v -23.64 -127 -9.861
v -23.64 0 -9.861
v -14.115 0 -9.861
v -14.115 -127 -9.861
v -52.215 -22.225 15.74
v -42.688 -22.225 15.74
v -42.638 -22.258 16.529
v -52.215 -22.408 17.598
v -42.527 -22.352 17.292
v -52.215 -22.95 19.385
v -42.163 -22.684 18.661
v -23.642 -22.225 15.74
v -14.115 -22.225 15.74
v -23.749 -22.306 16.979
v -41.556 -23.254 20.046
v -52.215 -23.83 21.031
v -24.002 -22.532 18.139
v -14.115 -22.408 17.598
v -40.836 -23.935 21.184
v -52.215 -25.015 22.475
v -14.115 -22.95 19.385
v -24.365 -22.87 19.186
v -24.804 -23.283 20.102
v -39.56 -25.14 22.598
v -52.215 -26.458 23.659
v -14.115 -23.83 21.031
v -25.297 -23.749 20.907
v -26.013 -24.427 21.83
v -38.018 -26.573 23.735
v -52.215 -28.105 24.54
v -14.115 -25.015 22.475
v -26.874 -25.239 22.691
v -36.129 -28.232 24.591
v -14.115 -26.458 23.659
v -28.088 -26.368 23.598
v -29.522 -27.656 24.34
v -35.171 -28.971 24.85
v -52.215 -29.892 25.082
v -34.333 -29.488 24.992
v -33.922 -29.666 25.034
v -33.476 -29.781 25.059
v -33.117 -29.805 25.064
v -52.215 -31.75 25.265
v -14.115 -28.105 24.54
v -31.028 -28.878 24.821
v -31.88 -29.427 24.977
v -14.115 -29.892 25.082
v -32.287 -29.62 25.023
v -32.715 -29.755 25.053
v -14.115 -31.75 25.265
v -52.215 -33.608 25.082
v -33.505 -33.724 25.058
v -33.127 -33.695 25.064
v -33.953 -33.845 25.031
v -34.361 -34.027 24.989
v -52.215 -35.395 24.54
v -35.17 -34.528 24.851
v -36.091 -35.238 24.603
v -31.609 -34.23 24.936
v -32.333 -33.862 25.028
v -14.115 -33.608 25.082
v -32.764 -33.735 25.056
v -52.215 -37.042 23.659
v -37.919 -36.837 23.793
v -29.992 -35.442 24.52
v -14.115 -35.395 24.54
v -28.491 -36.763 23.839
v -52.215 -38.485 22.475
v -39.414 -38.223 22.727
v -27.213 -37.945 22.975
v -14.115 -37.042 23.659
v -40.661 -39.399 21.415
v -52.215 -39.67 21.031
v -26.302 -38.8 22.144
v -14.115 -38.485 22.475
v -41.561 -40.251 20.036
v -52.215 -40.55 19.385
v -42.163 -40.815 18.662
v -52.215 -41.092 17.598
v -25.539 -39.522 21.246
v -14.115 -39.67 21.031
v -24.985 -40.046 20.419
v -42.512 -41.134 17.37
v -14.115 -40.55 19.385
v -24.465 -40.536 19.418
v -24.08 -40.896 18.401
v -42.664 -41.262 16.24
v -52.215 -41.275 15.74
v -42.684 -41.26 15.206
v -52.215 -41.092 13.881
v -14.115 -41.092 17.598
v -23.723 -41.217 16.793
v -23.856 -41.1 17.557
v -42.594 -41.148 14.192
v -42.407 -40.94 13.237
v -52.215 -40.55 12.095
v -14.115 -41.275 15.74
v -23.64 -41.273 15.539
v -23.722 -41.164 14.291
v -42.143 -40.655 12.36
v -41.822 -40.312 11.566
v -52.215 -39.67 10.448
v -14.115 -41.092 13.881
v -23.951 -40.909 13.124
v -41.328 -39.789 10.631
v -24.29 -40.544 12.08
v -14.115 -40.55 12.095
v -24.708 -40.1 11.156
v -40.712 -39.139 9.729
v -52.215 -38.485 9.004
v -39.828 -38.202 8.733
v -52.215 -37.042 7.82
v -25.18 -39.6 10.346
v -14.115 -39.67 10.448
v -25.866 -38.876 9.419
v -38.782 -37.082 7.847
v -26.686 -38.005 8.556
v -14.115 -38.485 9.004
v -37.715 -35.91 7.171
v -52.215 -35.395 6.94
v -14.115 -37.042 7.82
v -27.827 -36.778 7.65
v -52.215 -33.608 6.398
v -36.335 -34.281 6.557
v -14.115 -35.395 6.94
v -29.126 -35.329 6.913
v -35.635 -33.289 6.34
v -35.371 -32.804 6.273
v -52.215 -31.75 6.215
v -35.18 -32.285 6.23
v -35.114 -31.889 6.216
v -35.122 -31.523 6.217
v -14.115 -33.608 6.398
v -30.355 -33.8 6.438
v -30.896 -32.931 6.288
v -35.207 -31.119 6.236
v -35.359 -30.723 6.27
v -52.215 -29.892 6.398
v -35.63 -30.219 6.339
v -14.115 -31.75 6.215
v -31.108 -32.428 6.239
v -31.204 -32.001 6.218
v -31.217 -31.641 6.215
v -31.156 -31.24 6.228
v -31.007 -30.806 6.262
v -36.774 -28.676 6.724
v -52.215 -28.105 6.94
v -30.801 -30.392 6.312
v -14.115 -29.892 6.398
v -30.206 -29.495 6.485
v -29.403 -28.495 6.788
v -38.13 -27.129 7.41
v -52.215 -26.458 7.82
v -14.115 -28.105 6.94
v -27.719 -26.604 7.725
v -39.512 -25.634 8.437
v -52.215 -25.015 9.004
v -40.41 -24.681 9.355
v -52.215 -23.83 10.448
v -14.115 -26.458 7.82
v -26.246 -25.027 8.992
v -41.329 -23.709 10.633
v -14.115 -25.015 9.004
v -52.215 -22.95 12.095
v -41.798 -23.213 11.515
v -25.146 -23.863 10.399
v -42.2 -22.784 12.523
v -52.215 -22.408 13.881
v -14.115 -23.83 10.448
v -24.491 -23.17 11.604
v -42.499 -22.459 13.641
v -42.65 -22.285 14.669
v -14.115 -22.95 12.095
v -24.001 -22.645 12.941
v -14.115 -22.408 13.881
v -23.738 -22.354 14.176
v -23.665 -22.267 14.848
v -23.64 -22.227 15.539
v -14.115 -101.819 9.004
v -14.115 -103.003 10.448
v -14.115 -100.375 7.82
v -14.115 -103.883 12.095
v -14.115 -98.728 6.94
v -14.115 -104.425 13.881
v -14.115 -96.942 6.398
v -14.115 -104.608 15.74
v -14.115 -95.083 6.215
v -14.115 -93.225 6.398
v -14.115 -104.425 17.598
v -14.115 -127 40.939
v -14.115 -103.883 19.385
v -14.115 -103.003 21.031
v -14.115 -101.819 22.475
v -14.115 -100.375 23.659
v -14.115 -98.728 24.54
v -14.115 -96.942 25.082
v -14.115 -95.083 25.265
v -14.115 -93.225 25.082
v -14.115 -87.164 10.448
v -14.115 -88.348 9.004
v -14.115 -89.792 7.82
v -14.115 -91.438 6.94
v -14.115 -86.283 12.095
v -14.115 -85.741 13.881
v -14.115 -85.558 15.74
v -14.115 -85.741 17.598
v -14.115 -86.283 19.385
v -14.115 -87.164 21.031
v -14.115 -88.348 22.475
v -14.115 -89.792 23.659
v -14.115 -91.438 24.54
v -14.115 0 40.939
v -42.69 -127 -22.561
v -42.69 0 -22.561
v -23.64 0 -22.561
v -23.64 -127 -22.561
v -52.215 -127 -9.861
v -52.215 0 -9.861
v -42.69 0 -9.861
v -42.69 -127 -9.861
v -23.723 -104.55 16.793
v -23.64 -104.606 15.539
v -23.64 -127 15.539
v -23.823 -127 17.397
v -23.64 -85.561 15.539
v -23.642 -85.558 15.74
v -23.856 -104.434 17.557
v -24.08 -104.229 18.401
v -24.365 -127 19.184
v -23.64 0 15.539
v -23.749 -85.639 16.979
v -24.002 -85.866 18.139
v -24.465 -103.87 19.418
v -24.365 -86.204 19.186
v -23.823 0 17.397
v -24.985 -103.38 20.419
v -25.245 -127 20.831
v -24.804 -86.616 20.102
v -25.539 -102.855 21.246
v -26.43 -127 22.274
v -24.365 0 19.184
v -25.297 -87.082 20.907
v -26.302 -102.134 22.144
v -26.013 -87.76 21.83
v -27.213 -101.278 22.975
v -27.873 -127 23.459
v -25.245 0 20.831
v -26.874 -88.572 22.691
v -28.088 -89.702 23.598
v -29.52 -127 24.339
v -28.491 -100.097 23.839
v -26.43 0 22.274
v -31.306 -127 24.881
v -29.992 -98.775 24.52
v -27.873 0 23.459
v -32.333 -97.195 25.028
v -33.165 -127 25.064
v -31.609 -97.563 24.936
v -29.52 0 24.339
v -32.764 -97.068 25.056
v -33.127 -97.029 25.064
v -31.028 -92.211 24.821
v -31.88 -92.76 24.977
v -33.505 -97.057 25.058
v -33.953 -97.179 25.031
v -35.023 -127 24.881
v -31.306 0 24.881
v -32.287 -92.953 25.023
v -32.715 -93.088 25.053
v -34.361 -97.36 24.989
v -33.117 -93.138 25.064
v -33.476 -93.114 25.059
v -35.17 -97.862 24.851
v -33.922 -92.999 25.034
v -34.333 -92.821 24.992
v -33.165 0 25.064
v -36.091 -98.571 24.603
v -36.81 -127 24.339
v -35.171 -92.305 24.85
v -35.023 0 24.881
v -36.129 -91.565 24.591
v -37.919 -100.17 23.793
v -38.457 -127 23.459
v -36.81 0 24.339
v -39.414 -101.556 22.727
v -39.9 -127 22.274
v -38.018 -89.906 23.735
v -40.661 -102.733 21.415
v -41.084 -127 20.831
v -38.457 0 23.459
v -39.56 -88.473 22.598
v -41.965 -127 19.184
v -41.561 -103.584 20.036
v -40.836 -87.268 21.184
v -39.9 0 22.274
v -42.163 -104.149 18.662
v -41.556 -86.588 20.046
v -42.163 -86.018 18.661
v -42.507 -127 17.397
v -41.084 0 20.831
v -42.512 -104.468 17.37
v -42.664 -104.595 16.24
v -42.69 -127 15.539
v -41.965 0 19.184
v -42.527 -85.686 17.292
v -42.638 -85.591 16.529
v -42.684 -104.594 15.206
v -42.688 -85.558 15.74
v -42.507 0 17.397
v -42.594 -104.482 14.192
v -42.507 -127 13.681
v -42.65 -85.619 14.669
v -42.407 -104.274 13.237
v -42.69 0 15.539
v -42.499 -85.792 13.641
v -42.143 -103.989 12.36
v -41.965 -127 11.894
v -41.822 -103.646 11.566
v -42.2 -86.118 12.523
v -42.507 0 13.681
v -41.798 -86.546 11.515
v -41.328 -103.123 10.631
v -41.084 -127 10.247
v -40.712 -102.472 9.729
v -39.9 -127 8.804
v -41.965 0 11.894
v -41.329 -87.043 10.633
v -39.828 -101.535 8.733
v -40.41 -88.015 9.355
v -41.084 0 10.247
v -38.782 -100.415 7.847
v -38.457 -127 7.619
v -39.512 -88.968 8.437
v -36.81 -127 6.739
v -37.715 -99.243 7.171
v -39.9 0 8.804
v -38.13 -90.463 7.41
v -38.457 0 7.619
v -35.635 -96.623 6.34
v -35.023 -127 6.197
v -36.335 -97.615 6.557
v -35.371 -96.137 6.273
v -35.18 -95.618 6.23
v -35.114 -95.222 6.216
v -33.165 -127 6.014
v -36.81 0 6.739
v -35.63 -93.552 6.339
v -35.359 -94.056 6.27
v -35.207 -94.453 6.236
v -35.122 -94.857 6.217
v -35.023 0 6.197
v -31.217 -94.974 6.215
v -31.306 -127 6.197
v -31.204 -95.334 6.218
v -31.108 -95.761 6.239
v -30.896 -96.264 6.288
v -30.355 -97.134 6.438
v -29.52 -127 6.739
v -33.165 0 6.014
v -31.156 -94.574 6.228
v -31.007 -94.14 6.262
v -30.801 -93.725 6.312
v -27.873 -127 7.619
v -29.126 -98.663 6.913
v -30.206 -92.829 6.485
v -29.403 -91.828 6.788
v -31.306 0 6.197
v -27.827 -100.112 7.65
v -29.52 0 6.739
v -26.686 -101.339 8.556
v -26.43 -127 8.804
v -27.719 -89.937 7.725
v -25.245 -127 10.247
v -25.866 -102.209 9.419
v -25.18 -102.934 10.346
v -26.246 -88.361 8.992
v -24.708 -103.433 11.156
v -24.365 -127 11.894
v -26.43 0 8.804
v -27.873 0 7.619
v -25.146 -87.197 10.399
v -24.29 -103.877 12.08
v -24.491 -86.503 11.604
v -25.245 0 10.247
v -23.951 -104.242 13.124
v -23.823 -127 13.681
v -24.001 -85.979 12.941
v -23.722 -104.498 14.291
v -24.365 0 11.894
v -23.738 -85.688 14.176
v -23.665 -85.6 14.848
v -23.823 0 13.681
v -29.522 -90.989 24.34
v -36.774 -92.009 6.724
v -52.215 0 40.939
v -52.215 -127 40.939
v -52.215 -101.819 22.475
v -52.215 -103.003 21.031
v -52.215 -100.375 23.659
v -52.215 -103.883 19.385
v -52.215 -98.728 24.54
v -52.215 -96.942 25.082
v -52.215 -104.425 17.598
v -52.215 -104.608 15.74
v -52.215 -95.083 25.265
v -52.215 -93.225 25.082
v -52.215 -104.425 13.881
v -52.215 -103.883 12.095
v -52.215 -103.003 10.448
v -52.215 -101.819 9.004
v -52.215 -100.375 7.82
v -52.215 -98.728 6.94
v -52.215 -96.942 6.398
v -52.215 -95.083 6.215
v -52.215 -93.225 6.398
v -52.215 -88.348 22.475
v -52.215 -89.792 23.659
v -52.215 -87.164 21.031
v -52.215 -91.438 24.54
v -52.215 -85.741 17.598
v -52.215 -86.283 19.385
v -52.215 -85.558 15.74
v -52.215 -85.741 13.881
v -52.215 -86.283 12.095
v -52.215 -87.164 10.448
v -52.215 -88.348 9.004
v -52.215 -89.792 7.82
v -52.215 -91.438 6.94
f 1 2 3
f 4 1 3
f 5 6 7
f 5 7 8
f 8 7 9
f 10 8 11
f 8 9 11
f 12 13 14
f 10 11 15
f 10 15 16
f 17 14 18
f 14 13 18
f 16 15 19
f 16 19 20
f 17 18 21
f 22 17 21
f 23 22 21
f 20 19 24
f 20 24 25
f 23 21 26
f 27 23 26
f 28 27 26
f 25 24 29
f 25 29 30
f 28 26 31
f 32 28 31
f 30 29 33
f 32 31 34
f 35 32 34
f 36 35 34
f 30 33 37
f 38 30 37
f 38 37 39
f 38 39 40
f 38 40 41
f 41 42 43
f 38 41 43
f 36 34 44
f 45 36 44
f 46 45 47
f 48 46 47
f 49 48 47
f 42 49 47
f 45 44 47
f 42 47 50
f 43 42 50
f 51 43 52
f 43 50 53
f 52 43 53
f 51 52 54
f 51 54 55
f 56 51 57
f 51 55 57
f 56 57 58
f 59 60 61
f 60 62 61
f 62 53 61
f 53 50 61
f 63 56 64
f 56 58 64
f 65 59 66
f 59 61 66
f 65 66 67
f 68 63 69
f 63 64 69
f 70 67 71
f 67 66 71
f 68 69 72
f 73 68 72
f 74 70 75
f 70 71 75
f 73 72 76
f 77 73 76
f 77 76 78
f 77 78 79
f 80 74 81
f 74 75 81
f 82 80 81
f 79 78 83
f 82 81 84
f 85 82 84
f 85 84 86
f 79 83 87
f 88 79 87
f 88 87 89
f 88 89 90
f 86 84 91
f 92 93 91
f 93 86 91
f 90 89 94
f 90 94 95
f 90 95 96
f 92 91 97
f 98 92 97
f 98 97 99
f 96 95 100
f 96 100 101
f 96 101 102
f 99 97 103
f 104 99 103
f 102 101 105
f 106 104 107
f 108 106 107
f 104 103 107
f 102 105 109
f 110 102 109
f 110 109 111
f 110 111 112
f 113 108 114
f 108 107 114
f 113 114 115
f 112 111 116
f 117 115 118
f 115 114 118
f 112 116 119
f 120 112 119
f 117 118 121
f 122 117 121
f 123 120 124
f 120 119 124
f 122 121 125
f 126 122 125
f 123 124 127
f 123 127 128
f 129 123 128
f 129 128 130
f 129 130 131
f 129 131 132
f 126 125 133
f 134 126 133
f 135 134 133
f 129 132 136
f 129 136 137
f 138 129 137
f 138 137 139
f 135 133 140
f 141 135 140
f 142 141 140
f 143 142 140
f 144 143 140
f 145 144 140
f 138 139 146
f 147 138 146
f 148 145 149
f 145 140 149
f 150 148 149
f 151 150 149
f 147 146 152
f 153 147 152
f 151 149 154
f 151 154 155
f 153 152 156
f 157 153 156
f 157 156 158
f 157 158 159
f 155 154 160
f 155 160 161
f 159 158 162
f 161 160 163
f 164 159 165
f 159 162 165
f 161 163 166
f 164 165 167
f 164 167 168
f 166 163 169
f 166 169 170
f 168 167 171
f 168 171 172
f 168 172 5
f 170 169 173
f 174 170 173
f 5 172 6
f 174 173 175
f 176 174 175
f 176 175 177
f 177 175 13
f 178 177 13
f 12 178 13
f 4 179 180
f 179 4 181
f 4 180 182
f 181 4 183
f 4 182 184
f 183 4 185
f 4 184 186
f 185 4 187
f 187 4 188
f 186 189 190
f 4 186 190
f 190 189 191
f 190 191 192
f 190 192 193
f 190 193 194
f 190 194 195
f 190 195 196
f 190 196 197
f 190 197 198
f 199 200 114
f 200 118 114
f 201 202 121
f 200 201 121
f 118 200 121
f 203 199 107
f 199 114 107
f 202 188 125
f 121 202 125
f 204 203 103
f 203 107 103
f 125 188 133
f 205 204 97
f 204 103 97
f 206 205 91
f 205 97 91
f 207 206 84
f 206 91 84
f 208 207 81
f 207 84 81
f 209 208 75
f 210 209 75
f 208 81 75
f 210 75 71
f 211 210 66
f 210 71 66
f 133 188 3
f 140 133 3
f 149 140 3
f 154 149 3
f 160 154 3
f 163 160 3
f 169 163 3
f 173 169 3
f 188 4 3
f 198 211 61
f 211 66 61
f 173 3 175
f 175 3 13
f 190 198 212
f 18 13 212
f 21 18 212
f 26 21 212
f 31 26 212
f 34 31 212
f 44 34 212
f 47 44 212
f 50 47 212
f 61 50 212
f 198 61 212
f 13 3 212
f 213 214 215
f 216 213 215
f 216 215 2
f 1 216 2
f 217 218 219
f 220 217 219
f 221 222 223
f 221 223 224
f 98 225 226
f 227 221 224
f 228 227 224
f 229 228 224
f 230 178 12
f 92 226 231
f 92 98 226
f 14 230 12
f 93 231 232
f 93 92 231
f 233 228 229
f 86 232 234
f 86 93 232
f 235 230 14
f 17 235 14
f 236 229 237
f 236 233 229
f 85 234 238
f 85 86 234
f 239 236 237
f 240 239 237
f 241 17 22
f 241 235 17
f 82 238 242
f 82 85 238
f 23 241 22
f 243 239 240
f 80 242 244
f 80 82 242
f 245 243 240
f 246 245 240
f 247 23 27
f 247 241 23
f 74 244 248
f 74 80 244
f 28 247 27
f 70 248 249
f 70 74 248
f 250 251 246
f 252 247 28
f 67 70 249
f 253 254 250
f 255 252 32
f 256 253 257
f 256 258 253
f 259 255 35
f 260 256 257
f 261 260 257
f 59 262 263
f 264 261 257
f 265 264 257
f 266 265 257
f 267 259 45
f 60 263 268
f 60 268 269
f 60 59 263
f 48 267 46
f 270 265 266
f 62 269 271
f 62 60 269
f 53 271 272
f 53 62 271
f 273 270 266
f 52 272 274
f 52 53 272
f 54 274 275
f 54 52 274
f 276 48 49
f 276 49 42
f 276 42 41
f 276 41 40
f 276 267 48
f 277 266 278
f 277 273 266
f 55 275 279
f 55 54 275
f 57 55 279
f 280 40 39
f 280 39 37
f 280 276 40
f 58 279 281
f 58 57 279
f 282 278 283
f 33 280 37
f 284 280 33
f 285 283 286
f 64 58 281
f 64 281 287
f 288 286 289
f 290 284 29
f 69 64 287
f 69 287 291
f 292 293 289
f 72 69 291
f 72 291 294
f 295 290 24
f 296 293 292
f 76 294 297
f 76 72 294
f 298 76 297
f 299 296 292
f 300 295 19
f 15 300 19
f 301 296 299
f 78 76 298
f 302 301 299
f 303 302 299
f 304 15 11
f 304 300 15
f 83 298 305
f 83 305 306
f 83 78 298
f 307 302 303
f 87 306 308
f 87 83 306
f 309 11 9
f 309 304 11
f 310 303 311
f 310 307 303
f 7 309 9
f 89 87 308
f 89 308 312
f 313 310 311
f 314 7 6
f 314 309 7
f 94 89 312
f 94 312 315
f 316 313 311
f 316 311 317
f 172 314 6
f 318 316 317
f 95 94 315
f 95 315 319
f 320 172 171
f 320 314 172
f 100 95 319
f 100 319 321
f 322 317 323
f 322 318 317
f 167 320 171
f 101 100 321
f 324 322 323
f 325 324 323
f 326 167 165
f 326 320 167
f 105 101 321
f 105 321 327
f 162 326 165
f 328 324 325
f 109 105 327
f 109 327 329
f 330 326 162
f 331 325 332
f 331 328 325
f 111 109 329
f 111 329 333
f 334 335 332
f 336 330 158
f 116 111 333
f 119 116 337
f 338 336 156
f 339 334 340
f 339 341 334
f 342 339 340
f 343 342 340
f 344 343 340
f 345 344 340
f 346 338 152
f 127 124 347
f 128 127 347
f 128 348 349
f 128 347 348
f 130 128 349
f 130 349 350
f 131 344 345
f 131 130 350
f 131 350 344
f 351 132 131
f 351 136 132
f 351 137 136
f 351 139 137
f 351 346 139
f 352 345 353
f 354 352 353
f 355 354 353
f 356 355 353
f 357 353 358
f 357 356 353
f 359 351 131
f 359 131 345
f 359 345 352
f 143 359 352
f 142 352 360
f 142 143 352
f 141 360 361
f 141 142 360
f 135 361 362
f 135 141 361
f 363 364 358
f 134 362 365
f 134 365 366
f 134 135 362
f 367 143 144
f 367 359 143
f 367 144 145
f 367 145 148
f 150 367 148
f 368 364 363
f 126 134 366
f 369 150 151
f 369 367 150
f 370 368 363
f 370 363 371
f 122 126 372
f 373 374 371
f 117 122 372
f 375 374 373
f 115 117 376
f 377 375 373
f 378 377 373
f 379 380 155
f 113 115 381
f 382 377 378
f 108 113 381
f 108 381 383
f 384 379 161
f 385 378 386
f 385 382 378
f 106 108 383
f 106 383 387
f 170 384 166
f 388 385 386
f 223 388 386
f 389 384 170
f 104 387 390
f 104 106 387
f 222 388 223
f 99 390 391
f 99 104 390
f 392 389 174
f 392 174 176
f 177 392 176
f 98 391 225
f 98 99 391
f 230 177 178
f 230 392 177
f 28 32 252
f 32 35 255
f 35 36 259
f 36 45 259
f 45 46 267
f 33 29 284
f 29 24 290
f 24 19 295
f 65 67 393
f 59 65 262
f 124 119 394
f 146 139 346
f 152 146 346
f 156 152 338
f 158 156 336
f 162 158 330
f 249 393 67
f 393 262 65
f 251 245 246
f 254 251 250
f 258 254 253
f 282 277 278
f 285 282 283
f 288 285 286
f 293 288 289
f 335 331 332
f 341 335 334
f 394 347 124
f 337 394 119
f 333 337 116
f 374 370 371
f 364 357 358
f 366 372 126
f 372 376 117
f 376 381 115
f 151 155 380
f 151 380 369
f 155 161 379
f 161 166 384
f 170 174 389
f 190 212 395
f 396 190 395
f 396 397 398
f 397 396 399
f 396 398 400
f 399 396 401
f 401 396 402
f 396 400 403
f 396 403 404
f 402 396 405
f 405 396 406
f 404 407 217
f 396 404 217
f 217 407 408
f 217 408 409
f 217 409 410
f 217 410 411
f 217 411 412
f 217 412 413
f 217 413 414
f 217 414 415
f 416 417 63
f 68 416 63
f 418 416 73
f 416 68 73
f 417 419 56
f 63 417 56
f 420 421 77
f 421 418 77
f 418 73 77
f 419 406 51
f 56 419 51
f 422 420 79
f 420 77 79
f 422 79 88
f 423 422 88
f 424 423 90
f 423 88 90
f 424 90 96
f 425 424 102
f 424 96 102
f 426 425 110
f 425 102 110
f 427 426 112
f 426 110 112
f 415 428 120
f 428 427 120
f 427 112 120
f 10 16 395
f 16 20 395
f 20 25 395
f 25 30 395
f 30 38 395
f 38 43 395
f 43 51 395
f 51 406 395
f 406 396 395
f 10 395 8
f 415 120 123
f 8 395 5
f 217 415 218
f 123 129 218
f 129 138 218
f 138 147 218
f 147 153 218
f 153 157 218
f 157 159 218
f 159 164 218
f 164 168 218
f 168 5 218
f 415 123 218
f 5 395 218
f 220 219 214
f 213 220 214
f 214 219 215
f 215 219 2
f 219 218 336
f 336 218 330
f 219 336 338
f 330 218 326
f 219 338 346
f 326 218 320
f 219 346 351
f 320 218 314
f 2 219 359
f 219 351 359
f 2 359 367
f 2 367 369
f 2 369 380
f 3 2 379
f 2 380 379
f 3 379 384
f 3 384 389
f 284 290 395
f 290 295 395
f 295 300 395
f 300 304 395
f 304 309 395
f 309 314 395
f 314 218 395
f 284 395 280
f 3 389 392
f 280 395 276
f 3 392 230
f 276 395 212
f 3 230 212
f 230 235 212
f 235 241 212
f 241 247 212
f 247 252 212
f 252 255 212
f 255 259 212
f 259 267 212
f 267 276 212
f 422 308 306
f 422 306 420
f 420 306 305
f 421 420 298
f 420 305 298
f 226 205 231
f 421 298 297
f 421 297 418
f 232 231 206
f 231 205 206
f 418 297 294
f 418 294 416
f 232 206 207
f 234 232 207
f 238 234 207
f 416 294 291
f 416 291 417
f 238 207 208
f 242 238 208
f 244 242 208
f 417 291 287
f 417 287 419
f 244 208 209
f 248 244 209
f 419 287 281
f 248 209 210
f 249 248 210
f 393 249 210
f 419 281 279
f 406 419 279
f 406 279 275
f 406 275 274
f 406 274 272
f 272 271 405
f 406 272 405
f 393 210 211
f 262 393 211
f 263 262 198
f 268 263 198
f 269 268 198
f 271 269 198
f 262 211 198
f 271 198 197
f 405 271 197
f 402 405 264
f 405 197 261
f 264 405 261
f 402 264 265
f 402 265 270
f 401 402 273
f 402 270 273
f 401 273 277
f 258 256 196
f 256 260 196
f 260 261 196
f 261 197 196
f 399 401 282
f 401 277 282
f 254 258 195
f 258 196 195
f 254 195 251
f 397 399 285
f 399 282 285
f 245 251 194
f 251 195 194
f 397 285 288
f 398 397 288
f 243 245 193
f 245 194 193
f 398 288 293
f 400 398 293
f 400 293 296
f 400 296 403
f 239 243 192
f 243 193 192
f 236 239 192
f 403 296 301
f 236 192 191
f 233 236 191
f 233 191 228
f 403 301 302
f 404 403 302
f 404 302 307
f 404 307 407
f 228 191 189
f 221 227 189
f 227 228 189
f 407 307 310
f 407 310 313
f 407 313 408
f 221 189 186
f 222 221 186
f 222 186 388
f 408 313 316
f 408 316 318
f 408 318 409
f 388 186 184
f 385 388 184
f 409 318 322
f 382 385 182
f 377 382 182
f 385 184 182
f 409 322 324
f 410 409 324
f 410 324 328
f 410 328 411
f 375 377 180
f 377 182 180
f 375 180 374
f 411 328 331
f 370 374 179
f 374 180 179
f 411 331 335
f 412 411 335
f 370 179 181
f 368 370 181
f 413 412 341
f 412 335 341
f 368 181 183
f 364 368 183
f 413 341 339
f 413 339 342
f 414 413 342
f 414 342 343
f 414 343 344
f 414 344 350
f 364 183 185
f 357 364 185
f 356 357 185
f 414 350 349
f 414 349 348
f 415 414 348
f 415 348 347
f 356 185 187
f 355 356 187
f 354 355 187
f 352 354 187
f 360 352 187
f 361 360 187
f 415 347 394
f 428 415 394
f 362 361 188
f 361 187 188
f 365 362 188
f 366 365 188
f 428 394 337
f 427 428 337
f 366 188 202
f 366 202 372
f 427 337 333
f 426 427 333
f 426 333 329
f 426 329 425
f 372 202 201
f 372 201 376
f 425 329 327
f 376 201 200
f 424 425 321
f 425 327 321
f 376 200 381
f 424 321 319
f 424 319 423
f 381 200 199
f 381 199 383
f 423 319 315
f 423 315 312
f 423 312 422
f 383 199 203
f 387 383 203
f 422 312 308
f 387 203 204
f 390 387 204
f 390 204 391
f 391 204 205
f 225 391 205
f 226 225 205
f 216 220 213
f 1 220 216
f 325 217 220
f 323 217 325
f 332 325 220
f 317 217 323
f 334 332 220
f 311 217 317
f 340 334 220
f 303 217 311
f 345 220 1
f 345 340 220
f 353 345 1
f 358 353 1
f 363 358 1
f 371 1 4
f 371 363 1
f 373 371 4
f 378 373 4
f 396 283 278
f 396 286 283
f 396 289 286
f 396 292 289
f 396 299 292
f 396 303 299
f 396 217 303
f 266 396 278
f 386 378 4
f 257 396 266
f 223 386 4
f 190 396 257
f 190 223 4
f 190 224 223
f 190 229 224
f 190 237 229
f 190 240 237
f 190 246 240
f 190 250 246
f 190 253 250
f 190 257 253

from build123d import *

# Parameters (mm, degrees)
F0_R     = 9.525
F1_DEPTH = 127
F2_R     = 9.525
F3_DEPTH = 129.794
F4_DEPTH = 104.14


with BuildPart() as f1:
    # F0 (on Front) → F1 (new body)
    with BuildSketch(Plane.XZ):
        Polygon((-14.114713, 40.939018), (-52.214713, 40.939018), (-52.214713, 15.539018), (-52.214713, -9.860982), (-42.689713, -9.860982), (-42.689713, -22.560982), (-23.639713, -22.560982), (-23.639713, -9.860982), (-14.114713, -9.860982), align=None)
        with Locations((-33.164713, 15.539018)):
            Circle(F0_R, mode=Mode.SUBTRACT)
    extrude(amount=F1_DEPTH)

    # F2 (on Right) → F3 (cut)
    with BuildSketch(Plane.YZ):
        with Locations((-95.083439, 15.739672)):
            Circle(F2_R)
    extrude(amount=-F3_DEPTH, mode=Mode.SUBTRACT)

    # F2 (on Right) → F4 (cut)
    with BuildSketch(Plane.YZ):
        with Locations((-31.75, 15.739672)):
            Circle(F2_R)
    extrude(amount=-F4_DEPTH, mode=Mode.SUBTRACT)


solid = f1.part
